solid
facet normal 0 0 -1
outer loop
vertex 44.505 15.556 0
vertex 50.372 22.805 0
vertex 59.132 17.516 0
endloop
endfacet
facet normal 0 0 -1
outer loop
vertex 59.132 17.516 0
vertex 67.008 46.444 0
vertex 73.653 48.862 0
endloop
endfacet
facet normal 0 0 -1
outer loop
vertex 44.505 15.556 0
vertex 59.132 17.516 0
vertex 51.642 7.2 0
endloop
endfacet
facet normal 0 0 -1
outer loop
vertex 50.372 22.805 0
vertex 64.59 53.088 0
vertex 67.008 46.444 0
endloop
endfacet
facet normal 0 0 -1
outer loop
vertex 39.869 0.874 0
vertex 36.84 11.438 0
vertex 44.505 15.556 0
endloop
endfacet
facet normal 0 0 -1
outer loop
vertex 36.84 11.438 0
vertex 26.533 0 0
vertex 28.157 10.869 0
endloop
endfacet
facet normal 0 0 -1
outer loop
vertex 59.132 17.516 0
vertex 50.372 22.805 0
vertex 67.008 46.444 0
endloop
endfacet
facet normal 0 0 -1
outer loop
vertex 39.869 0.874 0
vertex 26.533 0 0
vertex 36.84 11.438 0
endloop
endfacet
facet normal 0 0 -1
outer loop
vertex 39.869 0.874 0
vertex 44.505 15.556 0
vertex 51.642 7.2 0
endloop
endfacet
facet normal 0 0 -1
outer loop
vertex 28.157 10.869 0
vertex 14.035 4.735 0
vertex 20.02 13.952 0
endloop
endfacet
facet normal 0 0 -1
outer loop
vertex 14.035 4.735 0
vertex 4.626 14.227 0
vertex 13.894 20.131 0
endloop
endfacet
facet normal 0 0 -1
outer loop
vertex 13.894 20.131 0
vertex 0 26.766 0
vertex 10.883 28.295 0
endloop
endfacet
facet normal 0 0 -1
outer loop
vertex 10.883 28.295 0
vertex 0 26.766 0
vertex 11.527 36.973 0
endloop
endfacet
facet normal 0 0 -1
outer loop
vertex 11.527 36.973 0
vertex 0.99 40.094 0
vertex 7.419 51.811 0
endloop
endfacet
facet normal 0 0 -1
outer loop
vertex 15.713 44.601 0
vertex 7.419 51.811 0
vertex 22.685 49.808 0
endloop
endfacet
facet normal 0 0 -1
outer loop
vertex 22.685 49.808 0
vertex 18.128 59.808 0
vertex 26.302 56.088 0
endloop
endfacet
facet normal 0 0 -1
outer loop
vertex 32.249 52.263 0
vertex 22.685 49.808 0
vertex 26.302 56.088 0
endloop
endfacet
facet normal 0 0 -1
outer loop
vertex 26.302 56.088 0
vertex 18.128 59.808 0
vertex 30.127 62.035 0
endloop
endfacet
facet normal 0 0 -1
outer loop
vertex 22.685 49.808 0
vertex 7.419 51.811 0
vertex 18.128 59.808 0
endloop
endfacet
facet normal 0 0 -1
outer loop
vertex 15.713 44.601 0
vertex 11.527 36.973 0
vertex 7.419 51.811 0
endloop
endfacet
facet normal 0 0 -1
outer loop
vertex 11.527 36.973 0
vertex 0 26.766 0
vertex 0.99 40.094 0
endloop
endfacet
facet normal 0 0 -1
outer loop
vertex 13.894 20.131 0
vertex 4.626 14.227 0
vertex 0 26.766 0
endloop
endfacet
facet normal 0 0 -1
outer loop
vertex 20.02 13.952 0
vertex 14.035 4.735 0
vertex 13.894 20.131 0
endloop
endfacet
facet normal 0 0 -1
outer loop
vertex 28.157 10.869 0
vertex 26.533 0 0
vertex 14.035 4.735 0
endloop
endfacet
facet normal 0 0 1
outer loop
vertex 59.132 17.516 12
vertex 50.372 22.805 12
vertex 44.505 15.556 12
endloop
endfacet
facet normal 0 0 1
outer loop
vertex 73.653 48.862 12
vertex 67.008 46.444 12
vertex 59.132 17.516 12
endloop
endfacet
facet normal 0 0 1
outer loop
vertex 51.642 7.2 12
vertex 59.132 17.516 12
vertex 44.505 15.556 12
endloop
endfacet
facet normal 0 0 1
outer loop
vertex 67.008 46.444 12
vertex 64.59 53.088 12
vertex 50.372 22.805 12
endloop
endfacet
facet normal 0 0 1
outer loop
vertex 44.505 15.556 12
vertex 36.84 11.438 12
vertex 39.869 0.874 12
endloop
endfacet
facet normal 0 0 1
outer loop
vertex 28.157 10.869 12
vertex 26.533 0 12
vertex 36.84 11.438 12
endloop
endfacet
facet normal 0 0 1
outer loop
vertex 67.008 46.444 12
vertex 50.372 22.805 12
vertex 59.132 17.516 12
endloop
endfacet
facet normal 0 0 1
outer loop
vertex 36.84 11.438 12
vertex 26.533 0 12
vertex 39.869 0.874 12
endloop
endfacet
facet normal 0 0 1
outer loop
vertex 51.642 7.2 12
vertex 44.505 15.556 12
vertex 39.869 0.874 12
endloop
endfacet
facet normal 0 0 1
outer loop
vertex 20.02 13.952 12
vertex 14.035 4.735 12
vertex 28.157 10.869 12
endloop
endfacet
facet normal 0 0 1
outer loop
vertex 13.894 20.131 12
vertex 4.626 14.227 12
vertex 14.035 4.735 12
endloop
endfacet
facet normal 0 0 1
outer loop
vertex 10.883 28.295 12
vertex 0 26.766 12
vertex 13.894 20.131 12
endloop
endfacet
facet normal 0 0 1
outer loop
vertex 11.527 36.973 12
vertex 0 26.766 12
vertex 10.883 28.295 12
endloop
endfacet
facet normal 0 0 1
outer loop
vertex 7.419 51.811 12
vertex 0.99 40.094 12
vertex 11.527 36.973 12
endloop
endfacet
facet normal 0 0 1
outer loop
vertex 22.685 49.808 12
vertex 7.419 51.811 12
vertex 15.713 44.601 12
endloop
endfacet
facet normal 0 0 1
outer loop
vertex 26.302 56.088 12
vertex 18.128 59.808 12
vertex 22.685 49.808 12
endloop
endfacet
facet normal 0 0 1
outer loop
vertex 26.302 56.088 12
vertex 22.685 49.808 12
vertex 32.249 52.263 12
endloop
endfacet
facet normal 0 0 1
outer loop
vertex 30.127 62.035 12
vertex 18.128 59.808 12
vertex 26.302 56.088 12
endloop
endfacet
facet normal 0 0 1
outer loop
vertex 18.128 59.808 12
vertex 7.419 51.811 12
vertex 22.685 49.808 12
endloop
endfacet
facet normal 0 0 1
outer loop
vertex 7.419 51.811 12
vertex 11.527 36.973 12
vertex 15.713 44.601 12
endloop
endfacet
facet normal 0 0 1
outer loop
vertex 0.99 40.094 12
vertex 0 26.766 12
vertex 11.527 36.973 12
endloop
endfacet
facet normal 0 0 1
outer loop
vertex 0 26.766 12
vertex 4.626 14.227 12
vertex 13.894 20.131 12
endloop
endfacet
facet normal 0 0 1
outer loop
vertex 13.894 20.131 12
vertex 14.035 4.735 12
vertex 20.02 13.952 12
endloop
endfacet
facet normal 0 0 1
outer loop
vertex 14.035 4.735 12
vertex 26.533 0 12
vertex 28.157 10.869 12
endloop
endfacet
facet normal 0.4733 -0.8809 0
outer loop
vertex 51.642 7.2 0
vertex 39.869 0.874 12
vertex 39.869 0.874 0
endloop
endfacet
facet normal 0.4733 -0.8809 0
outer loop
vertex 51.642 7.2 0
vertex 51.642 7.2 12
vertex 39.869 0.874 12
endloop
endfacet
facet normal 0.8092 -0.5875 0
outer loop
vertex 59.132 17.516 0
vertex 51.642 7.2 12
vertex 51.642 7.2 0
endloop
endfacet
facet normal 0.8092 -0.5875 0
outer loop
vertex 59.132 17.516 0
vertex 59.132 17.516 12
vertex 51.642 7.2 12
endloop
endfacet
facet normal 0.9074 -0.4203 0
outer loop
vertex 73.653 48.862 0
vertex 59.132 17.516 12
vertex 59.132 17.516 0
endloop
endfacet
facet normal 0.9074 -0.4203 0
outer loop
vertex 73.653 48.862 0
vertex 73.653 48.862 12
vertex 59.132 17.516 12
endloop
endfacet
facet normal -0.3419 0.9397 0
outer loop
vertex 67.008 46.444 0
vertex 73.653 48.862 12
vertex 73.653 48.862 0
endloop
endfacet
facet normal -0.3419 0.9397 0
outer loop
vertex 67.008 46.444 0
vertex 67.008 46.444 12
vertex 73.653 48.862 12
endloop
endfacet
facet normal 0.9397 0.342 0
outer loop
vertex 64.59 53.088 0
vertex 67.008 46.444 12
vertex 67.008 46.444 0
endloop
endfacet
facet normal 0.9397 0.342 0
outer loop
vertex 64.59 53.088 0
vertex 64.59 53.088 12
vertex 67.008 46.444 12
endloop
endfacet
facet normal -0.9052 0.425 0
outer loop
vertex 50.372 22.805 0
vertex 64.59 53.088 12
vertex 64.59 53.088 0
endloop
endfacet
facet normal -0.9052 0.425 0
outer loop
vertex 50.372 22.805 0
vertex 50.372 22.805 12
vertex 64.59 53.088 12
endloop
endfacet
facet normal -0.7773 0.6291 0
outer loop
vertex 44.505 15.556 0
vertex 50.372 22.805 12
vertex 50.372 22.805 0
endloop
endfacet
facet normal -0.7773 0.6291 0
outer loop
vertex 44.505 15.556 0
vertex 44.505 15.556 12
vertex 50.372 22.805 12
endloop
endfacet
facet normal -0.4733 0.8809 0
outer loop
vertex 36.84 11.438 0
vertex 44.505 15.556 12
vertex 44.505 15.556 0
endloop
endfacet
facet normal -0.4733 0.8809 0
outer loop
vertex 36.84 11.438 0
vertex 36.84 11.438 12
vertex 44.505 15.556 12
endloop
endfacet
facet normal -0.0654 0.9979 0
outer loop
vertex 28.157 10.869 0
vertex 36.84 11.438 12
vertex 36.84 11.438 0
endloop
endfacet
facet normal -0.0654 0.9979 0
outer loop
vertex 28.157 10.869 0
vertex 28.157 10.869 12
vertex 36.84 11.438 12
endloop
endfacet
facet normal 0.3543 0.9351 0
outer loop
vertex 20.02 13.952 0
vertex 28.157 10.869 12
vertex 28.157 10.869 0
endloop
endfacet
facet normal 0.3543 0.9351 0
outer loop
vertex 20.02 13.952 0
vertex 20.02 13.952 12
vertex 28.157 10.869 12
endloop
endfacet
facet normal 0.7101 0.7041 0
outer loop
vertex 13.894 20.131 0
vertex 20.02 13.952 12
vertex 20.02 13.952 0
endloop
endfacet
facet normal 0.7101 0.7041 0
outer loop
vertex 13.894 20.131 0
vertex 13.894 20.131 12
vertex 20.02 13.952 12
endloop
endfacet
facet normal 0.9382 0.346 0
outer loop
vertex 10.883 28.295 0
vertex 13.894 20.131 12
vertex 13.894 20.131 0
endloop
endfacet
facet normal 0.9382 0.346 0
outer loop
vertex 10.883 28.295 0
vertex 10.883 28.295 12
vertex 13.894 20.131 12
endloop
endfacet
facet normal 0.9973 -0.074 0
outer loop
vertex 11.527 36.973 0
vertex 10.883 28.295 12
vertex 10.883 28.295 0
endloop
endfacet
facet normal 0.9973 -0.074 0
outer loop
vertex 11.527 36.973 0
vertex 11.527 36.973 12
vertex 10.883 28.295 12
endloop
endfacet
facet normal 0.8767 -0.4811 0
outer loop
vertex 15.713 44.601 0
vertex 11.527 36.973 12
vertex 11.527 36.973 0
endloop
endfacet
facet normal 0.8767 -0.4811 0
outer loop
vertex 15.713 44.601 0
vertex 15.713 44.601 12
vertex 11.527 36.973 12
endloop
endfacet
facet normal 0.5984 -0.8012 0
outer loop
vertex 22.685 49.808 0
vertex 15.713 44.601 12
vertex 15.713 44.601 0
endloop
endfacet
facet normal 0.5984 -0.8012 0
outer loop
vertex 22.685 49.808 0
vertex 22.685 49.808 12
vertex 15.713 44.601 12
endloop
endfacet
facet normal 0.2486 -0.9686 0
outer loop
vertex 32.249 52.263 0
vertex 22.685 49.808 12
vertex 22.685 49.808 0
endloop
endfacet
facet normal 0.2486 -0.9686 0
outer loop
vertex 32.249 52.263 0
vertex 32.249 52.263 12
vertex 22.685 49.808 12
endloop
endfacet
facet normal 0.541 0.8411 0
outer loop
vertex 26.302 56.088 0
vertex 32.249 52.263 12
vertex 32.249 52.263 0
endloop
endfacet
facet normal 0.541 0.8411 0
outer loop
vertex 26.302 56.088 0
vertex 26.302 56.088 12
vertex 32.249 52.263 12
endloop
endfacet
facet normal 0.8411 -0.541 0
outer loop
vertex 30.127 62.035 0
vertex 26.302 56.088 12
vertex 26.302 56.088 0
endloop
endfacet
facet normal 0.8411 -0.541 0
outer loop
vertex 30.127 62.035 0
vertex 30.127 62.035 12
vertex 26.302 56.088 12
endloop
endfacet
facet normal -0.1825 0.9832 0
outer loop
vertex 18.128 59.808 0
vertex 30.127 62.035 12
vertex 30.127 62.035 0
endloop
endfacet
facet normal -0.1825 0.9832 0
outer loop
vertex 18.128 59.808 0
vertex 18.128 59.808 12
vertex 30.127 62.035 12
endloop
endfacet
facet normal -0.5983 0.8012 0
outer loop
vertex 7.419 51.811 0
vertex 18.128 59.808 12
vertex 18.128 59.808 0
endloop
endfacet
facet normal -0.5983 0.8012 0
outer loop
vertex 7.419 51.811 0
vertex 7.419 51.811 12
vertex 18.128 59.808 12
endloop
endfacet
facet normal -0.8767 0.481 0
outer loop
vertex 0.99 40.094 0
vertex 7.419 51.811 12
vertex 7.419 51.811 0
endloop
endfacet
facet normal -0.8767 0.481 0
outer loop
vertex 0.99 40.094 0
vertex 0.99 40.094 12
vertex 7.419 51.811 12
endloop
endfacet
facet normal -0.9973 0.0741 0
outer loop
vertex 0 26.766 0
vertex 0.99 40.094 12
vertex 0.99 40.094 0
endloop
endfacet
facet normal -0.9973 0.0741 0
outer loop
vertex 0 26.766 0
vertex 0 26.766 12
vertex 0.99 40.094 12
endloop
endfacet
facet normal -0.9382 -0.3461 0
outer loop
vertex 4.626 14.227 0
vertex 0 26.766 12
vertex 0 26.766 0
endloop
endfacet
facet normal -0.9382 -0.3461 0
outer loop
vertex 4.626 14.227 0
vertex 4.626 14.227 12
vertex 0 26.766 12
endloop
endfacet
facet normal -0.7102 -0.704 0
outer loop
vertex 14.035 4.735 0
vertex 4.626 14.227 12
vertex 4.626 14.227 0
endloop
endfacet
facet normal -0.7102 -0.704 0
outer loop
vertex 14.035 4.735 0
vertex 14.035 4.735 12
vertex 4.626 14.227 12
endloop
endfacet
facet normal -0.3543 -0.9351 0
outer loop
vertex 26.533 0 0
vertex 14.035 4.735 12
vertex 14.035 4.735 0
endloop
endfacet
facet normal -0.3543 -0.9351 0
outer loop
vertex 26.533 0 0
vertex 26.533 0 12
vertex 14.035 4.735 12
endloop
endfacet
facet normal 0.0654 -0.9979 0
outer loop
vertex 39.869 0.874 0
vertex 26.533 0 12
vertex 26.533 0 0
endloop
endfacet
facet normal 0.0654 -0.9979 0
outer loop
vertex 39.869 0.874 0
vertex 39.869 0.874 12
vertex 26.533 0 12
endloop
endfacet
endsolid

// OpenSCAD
$fn = 32;

// ----------------------------------------------------------------------
// Hook plate: curl radius 26 mm over 245 degrees, 10 mm thick band
// ----------------------------------------------------------------------

// --- parameters (mm) ---
profile_height = 12;      // extrusion height
profile_points = 26;      // points of the closed outline

profile = [[26.302, 56.088], [30.127, 62.035], [18.128, 59.808], [7.419, 51.811], [0.99, 40.094], [0, 26.766], [4.626, 14.227], [14.035, 4.735], [26.533, 0], [39.869, 0.874], [51.642, 7.2], [59.132, 17.516], [73.653, 48.862], [67.008, 46.444], [64.59, 53.088], [50.372, 22.805], [44.505, 15.556], [36.84, 11.438], [28.157, 10.869], [20.02, 13.952], [13.894, 20.131], [10.883, 28.295], [11.527, 36.973], [15.713, 44.601], [22.685, 49.808], [32.249, 52.263]];  // single closed polygon, 26 points, counter clockwise

// --- the one profile operation ---
linear_extrude(height = profile_height) polygon(points = profile);
